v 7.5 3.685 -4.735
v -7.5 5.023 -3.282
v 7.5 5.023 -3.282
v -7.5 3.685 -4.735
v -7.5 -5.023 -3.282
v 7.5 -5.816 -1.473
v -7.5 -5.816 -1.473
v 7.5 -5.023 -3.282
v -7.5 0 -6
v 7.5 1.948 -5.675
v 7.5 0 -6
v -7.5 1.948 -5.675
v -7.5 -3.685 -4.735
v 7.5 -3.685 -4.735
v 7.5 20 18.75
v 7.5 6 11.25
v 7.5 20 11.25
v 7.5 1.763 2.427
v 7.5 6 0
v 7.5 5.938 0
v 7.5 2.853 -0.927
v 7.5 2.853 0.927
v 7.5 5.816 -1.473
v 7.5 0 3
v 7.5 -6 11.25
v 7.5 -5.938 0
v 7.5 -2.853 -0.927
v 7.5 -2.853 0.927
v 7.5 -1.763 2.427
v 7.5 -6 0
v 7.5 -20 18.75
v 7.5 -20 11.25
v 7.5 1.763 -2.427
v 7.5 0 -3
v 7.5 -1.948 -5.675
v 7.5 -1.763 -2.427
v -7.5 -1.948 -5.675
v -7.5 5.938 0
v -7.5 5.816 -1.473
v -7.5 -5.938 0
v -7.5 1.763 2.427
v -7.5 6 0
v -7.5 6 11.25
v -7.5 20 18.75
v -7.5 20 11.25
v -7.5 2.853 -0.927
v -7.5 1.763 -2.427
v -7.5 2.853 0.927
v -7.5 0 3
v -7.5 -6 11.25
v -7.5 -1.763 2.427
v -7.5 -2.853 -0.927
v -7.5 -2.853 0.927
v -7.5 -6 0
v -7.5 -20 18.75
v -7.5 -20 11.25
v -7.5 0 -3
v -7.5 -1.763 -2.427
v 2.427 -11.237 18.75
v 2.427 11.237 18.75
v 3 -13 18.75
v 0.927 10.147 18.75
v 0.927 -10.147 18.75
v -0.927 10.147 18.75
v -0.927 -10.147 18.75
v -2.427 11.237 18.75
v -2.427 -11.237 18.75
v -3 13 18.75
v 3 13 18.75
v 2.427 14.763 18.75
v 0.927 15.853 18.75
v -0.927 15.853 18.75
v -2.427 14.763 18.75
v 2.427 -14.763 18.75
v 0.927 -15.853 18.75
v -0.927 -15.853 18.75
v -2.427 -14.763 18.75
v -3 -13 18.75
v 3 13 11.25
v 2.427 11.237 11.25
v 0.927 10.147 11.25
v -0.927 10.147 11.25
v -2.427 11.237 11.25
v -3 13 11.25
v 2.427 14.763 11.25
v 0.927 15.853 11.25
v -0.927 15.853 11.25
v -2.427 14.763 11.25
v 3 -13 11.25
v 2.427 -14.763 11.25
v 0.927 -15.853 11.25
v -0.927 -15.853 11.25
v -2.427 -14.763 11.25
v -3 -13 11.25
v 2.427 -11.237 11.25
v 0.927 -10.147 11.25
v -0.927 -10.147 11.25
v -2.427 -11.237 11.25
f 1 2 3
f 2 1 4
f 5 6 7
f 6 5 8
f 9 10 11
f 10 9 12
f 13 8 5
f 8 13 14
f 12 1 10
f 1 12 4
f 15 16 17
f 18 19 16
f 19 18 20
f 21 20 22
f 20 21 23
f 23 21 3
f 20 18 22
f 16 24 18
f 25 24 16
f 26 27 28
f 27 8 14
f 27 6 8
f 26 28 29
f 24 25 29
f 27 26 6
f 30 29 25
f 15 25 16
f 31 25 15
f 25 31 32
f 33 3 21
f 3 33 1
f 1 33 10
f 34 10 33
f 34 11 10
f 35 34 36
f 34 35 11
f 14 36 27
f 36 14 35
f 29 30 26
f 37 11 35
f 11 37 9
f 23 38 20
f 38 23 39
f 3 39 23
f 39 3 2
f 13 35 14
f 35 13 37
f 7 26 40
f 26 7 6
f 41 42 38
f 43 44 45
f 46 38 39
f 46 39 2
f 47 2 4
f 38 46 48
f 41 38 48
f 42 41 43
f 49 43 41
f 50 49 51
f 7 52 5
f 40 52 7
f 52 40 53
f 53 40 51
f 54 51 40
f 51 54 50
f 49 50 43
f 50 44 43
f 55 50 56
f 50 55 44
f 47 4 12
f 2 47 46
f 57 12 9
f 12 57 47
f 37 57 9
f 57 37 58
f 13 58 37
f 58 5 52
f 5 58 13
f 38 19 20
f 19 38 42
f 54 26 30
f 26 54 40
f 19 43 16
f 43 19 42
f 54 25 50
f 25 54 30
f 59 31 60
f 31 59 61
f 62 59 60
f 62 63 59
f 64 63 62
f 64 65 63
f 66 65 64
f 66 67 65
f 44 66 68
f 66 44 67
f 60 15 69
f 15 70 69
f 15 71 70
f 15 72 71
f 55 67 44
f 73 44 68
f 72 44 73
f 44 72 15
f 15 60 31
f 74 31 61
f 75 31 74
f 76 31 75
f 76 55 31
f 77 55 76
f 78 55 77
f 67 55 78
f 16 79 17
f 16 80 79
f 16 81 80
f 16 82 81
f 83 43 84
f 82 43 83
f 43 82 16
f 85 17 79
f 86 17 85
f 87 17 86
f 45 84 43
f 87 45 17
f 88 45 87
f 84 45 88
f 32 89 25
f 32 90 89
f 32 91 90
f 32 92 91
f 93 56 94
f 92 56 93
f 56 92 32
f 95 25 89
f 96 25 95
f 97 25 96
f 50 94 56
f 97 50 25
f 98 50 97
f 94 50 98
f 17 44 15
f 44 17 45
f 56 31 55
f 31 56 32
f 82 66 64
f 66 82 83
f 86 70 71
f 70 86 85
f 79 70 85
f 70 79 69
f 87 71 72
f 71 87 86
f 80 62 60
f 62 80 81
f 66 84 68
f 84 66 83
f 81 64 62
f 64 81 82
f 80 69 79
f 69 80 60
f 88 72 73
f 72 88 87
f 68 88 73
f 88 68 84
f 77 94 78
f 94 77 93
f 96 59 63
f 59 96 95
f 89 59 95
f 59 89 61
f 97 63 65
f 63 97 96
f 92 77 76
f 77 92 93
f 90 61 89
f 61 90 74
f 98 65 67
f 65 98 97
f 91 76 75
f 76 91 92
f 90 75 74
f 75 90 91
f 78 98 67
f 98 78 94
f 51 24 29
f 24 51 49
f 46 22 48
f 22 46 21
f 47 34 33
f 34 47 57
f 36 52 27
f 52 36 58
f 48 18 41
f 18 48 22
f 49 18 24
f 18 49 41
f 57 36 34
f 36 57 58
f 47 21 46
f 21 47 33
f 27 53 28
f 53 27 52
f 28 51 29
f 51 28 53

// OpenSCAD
module baseShape() {
    rotate([0,90,0]) {translate([0,0,-7.5]) {cylinder(15,6,6,0,true);}}
    translate([0,0,7.5]) { cube([15,12,15],true); }
    translate([0,0,15]) { cube([15,40,7.5],true); }
}

difference() {
baseShape();
    translate([0,13,0]) { cylinder(50,3,3,0, true); }
    translate([0,-13,0]) { cylinder(50,3,3,0, true); }
    rotate([0,90,0]) { translate([0,0,-10]) {cylinder(50,3,3,0,true); }}
}

    
